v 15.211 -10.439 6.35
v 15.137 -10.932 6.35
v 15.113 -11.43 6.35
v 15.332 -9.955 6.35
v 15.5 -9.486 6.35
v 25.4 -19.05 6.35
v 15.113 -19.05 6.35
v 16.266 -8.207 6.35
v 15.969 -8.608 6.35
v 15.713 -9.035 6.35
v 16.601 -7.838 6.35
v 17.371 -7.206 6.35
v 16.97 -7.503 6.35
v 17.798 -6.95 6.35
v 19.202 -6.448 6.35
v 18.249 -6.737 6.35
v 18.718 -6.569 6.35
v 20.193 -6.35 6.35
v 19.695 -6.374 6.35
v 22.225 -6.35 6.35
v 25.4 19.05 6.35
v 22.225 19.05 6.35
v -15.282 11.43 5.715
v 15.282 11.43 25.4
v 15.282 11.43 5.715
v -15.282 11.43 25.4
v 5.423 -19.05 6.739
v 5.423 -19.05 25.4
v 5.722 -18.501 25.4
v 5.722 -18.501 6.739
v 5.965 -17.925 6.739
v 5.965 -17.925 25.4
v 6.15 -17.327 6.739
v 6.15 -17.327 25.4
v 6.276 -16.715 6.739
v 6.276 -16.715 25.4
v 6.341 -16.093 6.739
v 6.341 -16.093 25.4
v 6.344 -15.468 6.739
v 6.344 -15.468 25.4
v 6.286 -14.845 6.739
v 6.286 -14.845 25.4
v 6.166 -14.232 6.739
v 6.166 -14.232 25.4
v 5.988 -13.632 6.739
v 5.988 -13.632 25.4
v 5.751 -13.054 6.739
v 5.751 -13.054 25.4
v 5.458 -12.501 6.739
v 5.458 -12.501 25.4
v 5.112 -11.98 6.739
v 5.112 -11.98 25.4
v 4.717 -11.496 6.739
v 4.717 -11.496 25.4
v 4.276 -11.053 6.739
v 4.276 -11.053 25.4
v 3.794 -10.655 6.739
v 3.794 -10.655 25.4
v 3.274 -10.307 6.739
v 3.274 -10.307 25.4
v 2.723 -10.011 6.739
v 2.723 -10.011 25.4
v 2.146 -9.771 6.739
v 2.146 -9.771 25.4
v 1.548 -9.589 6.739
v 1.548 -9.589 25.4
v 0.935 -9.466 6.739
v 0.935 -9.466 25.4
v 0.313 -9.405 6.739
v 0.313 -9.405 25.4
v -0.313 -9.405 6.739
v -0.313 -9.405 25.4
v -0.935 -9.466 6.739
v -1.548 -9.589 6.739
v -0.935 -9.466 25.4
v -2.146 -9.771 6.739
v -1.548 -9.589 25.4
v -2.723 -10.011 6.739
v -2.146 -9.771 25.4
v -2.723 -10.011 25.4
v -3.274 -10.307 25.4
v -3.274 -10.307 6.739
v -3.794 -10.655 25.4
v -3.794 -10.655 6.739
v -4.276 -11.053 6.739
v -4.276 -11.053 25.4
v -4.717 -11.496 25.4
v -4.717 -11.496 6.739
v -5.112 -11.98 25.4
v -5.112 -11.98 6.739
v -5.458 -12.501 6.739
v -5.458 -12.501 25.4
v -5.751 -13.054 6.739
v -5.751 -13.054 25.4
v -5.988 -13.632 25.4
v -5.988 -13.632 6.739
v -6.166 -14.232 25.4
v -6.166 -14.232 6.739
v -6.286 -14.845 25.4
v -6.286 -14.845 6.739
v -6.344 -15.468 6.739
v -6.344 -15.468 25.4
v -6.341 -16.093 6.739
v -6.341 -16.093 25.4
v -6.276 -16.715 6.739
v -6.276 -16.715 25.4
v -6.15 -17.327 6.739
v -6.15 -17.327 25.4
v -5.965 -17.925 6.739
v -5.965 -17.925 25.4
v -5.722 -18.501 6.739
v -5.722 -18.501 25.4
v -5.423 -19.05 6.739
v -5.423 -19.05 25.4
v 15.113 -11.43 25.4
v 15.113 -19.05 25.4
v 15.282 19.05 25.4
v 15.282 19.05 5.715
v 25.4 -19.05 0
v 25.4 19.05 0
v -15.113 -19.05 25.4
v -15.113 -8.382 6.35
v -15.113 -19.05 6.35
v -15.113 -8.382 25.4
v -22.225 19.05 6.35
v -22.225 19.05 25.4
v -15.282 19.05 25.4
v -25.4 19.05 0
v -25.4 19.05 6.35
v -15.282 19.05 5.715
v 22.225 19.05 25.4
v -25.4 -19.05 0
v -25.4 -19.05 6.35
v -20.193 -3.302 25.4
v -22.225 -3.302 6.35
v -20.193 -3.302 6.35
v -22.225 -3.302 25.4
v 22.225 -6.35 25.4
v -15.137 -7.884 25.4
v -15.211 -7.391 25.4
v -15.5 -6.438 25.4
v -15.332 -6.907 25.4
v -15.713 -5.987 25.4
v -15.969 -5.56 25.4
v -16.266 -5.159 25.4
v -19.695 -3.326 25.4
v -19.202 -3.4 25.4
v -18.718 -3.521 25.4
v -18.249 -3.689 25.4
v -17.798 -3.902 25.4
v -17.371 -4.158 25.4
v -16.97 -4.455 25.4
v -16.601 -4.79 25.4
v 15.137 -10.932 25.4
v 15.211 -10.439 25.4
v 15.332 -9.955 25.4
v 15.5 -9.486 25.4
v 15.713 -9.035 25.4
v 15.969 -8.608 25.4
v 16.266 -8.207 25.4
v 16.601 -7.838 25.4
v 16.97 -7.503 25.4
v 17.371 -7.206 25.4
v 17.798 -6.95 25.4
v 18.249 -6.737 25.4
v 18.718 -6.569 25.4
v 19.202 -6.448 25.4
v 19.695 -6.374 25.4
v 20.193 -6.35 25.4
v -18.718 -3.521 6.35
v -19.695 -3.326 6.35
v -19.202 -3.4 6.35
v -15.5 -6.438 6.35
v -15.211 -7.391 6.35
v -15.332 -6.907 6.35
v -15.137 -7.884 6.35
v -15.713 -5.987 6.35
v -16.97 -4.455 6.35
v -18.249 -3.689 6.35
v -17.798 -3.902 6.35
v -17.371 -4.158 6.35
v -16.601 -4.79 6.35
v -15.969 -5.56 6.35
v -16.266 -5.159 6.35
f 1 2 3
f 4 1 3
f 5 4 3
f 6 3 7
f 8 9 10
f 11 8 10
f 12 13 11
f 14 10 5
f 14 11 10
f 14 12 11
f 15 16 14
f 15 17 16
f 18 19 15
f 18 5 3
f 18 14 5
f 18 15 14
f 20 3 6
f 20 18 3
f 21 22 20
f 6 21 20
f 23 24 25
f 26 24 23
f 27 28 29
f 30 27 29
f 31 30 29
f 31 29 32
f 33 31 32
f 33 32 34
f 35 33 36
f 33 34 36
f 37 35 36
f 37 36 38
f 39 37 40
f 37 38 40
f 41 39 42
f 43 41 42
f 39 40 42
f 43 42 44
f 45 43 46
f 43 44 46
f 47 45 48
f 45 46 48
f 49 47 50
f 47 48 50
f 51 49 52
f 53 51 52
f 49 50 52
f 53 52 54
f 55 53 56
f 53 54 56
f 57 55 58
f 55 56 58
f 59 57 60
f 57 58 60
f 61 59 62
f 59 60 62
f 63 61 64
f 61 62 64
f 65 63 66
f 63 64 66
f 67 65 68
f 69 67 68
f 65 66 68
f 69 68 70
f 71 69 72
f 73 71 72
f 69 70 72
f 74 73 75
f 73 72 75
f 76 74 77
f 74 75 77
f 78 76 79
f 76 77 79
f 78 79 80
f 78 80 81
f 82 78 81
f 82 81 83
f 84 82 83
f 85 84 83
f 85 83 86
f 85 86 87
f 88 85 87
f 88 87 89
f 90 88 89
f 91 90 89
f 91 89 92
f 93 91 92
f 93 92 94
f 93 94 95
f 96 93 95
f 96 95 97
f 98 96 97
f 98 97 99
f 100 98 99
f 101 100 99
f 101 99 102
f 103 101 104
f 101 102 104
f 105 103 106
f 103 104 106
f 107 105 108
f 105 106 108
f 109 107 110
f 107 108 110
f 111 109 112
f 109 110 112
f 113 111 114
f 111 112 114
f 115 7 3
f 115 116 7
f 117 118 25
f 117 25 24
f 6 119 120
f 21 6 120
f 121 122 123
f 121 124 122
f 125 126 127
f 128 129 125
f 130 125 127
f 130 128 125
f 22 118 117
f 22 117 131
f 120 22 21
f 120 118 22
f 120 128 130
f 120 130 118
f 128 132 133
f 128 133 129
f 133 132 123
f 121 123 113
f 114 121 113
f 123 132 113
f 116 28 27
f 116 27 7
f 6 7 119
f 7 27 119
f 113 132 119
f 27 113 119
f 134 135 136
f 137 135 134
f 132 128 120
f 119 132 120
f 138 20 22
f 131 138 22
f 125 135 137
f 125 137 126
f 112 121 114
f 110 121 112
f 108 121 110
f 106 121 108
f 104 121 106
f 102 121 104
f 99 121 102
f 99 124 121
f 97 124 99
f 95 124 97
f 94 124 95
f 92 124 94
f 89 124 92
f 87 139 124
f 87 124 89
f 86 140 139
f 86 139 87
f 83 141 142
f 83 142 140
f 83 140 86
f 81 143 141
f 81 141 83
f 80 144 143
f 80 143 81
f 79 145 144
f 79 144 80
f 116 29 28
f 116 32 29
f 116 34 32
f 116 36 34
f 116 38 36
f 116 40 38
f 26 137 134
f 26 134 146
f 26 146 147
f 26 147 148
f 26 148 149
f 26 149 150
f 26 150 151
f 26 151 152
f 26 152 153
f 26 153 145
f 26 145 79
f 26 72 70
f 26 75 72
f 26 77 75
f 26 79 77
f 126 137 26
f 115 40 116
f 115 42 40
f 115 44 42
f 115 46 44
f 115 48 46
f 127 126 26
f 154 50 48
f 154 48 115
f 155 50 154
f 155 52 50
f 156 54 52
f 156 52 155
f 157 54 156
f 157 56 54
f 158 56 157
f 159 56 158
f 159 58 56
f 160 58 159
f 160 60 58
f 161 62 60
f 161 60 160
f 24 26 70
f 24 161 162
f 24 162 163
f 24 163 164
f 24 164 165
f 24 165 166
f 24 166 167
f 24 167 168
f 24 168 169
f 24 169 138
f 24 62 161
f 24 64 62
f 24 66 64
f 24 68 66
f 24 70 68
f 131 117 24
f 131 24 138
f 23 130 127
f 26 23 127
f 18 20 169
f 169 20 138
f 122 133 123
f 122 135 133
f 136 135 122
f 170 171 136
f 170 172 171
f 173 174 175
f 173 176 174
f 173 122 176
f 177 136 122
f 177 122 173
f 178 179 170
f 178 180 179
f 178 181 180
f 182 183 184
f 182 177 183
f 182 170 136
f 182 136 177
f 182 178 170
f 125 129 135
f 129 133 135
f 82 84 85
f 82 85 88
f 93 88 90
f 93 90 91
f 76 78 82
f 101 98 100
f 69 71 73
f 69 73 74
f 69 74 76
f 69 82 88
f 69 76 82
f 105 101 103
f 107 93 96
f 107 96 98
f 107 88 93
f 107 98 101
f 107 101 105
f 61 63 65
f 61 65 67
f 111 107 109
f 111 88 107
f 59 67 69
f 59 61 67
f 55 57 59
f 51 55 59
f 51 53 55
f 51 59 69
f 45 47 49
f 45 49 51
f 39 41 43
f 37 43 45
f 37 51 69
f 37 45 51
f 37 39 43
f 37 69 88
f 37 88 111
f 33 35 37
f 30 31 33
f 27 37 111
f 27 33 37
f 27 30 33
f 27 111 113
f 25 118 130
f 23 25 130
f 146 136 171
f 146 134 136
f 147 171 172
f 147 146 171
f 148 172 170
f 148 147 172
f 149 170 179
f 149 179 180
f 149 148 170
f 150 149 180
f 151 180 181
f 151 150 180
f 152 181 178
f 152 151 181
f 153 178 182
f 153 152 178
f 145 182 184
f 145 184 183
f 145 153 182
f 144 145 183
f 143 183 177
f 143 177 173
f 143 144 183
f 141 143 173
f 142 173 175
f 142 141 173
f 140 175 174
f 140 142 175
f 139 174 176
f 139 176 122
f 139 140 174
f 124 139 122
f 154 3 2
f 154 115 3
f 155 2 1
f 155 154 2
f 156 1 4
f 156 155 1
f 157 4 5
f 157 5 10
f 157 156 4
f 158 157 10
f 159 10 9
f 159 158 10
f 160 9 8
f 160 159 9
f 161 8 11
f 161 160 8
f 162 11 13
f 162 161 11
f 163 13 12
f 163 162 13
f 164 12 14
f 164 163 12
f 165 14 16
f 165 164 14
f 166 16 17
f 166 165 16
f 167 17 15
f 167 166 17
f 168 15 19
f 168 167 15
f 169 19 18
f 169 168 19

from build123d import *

# Parameters (mm, degrees)
F0_W      = 50.8
F0_H      = 38.1
F1_DEPTH  = 6.35
F2_W      = 44.45
F2_H      = 38.1
F3_DEPTH  = 19.05
F4_W      = 6.35
F4_H      = 19.05
F6_W      = 30.563162
F6_H      = 19.685
F7_DEPTH  = 7.62
F8_W      = 15.748
F8_H      = 19.05
F9_DEPTH  = 7.112
F10_W     = 12.7
F10_H     = 19.05
F11_DEPTH = 7.112
F12_R     = 5.08
F13_R     = 5.08


with BuildPart() as f1:
    # F0 (on Top) → F1 (new body)
    with BuildSketch(Plane.XY):
        Rectangle(F0_W, F0_H)
    extrude(amount=F1_DEPTH)

    # F2 (on face) → F3 (join)
    with BuildSketch(Plane.XY.offset(6.35)):
        Rectangle(F2_W, F2_H)
    extrude(amount=F3_DEPTH)

    # F4 (on Right) → F5 (revolve, cut)
    with BuildSketch(Plane.YZ):
        with Locations((-18.92219, 16.263971)):
            Rectangle(F4_W, F4_H)
    revolve(axis=Axis((0, -15.74719, 16.263971), (0, 0, 1)), mode=Mode.SUBTRACT)

    # F6 (on face) → F7 (cut)
    with BuildSketch(Plane(origin=(0, 19.05, 0), x_dir=(-1, 0, 0), z_dir=(0, 1, 0))):
        with Locations((0, 15.5575)):
            Rectangle(F6_W, F6_H)
    extrude(amount=-F7_DEPTH, mode=Mode.SUBTRACT)

    # F8 (on face) → F9 (cut)
    with BuildSketch(Plane(origin=(-22.225, 0, 0), x_dir=(0, -1, 0), z_dir=(-1, 0, 0))):
        with Locations((11.176, 15.875)):
            Rectangle(F8_W, F8_H)
    extrude(amount=-F9_DEPTH, mode=Mode.SUBTRACT)

    # F10 (on face) → F11 (cut)
    with BuildSketch(Plane.YZ.offset(22.225)):
        with Locations((-12.7, 15.875)):
            Rectangle(F10_W, F10_H)
    extrude(amount=-F11_DEPTH, mode=Mode.SUBTRACT)

    # F12
    f12_edges = [f1.edges().sort_by_distance(p)[0] for p in [
        (-15.113, -3.302, 15.875),
    ]]
    fillet(f12_edges, radius=F12_R)

    # F13
    f13_edges = [f1.edges().sort_by_distance(p)[0] for p in [
        (15.113, -6.35, 15.875),
    ]]
    fillet(f13_edges, radius=F13_R)


solid = f1.part
